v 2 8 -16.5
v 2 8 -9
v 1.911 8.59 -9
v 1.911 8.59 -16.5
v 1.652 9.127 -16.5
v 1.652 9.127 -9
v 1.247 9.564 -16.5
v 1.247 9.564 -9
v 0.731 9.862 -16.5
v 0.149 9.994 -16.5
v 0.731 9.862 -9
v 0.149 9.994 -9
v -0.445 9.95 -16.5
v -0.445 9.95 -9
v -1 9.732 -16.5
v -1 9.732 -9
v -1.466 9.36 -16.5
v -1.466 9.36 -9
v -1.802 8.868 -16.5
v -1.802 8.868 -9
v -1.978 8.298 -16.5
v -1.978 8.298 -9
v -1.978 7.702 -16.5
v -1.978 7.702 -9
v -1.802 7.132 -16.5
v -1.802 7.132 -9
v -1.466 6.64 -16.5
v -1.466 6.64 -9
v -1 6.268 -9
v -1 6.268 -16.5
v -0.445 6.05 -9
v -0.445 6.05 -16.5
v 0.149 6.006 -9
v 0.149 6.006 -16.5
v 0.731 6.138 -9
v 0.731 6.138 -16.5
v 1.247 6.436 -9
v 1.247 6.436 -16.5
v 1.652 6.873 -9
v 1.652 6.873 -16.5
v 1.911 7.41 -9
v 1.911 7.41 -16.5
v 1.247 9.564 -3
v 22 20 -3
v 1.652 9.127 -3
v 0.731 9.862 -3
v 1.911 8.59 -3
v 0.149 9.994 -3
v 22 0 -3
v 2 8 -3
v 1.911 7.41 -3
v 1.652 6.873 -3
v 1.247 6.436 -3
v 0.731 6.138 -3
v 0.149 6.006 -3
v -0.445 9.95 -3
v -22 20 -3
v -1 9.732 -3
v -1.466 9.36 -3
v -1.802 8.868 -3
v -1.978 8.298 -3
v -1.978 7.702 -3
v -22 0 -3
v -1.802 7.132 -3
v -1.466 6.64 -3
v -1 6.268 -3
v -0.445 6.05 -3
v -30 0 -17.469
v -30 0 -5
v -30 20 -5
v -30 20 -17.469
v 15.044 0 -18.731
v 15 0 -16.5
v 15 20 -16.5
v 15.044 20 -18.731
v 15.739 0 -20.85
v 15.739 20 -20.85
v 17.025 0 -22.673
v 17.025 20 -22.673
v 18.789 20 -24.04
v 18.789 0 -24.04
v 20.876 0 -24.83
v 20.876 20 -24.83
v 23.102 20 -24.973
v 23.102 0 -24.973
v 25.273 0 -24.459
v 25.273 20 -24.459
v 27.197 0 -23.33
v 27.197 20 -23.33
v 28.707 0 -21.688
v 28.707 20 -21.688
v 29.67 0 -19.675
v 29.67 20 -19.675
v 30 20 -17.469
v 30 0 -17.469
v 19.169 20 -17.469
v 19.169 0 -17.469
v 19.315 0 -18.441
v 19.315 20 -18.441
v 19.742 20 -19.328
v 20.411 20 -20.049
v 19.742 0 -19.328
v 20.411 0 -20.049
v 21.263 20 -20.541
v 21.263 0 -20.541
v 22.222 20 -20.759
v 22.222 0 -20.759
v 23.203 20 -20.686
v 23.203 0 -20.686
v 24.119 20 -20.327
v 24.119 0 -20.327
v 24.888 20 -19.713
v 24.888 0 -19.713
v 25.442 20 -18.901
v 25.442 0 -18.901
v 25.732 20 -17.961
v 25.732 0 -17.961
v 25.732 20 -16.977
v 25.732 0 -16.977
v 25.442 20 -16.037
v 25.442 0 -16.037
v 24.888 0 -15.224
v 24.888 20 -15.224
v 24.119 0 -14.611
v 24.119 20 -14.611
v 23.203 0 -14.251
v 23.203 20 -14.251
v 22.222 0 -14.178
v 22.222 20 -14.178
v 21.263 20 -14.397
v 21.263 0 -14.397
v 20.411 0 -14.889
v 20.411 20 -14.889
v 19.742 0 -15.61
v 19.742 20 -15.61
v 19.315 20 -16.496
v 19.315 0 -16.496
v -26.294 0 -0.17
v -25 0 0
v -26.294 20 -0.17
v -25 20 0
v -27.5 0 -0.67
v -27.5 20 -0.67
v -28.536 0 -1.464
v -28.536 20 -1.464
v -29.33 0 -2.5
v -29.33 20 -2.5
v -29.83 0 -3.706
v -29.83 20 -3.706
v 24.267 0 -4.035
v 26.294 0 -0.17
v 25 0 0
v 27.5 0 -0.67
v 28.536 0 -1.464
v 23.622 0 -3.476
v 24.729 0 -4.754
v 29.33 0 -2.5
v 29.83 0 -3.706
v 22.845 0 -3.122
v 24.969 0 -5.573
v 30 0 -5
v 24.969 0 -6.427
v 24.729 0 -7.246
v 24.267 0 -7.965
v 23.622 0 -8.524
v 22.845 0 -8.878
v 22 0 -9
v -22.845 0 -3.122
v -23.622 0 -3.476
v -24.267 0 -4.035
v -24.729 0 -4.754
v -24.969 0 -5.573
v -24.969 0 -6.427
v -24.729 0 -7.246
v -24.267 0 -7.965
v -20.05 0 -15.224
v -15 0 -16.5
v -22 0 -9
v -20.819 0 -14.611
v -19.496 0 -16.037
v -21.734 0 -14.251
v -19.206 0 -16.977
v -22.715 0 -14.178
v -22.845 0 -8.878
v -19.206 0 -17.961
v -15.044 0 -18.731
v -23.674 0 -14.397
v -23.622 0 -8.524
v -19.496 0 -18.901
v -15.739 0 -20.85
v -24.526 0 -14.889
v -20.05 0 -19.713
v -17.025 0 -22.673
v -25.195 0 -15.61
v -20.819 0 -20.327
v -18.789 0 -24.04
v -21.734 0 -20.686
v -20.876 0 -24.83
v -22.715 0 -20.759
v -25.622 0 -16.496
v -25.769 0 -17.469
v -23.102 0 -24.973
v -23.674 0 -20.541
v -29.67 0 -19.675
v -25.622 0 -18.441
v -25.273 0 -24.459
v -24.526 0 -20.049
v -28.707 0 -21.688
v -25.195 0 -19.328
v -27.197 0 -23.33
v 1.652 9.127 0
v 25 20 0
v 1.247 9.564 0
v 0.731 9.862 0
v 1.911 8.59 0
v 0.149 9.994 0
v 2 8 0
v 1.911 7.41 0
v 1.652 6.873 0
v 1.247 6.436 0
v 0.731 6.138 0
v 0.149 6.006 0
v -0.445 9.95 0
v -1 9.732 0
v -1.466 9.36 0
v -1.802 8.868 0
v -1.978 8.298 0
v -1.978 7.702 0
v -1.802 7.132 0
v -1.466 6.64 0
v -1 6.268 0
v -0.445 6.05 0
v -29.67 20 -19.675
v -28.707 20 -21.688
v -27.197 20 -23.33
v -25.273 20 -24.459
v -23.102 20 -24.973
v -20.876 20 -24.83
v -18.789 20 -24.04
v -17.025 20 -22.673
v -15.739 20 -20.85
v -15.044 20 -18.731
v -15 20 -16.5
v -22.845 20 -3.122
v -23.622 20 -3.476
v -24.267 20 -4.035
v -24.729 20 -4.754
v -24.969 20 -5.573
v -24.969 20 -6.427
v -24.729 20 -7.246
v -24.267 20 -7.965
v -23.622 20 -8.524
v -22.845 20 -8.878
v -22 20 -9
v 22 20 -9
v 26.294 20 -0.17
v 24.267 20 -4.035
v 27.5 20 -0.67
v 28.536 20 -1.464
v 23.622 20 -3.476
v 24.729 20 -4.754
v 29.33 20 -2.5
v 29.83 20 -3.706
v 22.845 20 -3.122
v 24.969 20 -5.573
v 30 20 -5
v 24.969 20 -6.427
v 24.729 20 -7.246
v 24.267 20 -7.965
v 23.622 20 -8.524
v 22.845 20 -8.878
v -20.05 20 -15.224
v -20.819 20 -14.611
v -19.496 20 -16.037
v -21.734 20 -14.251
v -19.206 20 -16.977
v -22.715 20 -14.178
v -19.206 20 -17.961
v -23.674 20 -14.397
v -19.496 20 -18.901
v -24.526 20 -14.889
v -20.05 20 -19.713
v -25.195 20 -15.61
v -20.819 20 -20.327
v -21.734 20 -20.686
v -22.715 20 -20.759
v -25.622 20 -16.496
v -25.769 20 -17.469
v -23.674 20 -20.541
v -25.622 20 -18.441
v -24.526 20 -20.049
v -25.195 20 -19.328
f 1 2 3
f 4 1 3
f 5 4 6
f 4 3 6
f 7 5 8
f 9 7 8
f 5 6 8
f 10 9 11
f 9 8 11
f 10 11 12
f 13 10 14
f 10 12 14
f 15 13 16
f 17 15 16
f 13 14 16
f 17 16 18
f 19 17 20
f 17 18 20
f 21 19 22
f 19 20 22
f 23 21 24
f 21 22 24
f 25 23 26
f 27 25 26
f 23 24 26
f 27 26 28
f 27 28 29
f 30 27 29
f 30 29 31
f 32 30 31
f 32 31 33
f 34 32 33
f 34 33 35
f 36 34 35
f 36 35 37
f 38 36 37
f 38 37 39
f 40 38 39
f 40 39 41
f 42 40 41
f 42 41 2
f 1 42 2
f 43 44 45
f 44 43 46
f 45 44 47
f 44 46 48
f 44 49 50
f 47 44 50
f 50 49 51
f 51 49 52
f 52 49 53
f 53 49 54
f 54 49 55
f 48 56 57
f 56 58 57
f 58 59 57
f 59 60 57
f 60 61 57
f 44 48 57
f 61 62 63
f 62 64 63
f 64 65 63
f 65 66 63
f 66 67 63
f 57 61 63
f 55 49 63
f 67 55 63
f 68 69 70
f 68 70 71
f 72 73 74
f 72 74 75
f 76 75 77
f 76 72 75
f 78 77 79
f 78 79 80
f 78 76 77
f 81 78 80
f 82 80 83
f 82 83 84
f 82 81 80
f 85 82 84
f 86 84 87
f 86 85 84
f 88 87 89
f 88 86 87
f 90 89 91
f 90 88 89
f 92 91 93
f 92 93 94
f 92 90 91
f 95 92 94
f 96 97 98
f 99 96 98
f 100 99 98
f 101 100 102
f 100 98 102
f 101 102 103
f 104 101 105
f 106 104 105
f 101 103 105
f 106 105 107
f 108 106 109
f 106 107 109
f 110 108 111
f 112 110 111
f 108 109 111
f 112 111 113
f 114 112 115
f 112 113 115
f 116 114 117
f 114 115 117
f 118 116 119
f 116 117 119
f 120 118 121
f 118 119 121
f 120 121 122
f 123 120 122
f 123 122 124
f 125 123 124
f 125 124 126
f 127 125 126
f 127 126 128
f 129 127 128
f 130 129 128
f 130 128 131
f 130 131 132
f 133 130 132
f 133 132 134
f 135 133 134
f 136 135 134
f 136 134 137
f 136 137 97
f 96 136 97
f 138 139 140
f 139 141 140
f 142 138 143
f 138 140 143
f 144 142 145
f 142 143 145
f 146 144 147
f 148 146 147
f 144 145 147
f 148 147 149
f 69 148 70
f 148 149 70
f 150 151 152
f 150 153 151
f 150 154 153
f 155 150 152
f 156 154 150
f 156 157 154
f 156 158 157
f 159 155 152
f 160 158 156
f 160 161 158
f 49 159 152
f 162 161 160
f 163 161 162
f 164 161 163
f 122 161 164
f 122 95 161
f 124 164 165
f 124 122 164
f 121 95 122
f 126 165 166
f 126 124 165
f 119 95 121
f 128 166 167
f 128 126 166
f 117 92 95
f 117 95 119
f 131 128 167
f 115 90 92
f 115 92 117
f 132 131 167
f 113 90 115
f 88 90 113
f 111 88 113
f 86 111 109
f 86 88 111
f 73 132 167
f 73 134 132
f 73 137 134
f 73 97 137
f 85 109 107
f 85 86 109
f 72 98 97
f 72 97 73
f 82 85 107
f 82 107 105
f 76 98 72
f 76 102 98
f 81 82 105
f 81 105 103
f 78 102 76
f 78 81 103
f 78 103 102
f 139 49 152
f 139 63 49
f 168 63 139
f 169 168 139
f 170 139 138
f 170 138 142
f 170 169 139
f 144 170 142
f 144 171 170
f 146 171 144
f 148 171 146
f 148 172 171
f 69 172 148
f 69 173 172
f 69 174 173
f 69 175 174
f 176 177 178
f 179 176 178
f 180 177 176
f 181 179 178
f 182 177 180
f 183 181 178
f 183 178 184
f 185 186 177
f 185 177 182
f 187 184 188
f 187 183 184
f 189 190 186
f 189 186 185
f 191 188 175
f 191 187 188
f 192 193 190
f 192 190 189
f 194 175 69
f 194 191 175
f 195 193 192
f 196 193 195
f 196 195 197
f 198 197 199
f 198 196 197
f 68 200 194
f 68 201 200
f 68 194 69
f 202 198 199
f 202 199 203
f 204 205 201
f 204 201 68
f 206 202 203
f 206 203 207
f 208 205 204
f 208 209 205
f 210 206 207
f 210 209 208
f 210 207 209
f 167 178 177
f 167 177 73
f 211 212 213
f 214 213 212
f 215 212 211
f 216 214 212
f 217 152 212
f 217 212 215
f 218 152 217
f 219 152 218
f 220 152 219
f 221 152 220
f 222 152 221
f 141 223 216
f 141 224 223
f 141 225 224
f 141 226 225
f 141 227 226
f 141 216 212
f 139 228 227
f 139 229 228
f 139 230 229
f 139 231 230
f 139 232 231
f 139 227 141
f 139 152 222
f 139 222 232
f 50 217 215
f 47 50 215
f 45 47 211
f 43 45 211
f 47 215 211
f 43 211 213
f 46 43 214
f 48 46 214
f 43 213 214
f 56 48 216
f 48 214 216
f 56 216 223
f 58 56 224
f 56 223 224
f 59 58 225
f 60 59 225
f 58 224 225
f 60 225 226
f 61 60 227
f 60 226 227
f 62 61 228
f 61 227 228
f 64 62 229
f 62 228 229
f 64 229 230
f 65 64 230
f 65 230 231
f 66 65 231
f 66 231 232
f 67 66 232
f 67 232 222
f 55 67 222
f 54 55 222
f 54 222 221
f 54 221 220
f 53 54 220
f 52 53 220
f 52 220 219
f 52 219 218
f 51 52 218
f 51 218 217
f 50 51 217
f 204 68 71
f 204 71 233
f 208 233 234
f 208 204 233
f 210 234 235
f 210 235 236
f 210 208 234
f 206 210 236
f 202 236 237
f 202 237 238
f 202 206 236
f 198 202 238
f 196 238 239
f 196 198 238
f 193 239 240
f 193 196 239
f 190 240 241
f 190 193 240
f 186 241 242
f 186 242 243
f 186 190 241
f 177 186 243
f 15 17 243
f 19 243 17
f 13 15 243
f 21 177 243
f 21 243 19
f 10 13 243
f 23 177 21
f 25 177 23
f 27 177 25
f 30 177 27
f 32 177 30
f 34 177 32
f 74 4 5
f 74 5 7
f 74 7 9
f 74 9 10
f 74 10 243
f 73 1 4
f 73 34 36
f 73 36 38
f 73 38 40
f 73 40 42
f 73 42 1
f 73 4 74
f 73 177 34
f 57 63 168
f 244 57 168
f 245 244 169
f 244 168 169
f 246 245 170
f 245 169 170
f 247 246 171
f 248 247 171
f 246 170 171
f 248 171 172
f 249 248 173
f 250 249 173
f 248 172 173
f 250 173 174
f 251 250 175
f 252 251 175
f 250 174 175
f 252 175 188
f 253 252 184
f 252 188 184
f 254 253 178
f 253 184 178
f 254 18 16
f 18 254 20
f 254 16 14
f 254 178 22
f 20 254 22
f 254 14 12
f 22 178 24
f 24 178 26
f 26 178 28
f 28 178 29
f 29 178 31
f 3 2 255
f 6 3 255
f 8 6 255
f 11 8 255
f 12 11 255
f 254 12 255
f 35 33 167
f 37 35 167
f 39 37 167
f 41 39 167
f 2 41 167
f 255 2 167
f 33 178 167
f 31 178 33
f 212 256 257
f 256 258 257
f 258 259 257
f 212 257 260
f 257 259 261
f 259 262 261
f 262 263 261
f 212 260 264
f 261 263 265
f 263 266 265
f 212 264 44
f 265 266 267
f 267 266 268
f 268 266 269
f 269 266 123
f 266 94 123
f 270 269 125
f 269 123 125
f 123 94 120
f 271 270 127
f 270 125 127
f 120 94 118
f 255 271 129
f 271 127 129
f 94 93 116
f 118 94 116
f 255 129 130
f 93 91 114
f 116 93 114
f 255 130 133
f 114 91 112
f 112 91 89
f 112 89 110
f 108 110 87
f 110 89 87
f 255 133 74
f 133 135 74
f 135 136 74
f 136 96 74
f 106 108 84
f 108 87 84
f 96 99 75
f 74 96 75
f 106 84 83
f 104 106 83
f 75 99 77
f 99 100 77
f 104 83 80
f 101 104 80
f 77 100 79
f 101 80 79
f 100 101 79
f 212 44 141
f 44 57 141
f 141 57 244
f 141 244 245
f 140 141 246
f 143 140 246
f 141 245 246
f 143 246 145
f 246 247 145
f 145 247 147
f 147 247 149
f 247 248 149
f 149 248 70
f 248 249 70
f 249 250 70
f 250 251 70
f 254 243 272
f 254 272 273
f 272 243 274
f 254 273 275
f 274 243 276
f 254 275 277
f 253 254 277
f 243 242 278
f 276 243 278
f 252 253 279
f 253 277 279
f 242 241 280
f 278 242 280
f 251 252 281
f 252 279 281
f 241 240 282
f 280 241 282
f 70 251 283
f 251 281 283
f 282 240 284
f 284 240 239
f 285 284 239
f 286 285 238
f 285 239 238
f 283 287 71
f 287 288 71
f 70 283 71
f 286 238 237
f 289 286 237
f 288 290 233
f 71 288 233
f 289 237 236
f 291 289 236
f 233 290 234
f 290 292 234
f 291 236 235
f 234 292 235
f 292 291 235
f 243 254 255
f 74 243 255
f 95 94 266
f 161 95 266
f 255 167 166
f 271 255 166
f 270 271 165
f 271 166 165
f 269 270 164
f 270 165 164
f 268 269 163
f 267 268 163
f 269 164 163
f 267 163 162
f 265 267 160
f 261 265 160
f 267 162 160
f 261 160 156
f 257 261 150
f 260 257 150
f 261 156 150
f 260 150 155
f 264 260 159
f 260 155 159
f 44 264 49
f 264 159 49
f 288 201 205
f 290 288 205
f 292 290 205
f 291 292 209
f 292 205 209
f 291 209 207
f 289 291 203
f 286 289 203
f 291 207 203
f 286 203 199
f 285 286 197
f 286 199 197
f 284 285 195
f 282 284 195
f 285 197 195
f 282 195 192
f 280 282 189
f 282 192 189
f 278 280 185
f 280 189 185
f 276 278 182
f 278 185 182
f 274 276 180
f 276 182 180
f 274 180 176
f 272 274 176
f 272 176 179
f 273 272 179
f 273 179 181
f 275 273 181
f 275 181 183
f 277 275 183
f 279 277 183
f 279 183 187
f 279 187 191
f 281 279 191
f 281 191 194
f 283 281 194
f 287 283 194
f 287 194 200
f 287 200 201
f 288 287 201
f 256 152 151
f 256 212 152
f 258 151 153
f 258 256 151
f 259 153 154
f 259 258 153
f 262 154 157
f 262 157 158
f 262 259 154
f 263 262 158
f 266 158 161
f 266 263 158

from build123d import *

# Parameters (mm, degrees)
ESQUISSE1_R             = 3
BOSS_EXTRU_1_DEPTH      = 20
ESQUISSE2_R             = 2
ENL_V_MAT_EXTRU_1_DEPTH = 44.874821937
CONG_1_R                = 5
D_GAGEMENT_M61_D        = 6.6


with BuildPart() as part:
    # Esquisse1 → Boss.-Extru.1 (new body)
    with BuildSketch(Plane(origin=(0, 0, 0), x_dir=(1, 0, 0), z_dir=(0, 1, 0))):
        with BuildLine():
            Line((30, 0), (-30, 0))
            Line((-30, 0), (-30, 17.468719423))
            ThreePointArc((-30, 17.468719423), (-21.983350692, 24.984343437), (-15, 16.5))
            Line((-15, 16.5), (15, 16.5))
            ThreePointArc((15, 16.5), (21.983350692, 24.984343437), (30, 17.468719423))
            Line((30, 17.468719423), (30, 0))
        make_face()
        with Locations(Location((-22.468719423, 17.468719423, 0), (0, 0, 270))):
            Circle(ESQUISSE1_R, mode=Mode.SUBTRACT)
        with Locations(Location((22.468719423, 17.468719423, 0), (0, 0, 90))):
            Circle(ESQUISSE1_R, mode=Mode.SUBTRACT)
        with BuildLine():
            Line((22, 3), (-22, 3))
            ThreePointArc((-22, 3), (-25, 6), (-22, 9))
            Line((-22, 9), (22, 9))
            ThreePointArc((22, 9), (25, 6), (22, 3))
        make_face(mode=Mode.SUBTRACT)
    extrude(amount=BOSS_EXTRU_1_DEPTH)

    # Esquisse2 → Enlèv. mat.-Extru.1 (cut, through all)
    with BuildSketch(Plane.XY):
        with Locations((0, 8)):
            Circle(ESQUISSE2_R)
    extrude(amount=-ENL_V_MAT_EXTRU_1_DEPTH, mode=Mode.SUBTRACT)

    # Congé1
    cong_1_edges = [part.edges().sort_by_distance(p)[0] for p in [
        (30, 10, 0),
        (-30, 10, 0),
    ]]
    fillet(cong_1_edges, radius=CONG_1_R)

    # Dégagement M61 (through all)
    with Locations(Plane(origin=(0, 20, 0), x_dir=(1, 0, 0), z_dir=(0, 1, 0))):
        with Locations((-22.468719423, 17.468719423), (22.468719423, 17.468719423)):
            Hole(D_GAGEMENT_M61_D / 2)


solid = part.part
